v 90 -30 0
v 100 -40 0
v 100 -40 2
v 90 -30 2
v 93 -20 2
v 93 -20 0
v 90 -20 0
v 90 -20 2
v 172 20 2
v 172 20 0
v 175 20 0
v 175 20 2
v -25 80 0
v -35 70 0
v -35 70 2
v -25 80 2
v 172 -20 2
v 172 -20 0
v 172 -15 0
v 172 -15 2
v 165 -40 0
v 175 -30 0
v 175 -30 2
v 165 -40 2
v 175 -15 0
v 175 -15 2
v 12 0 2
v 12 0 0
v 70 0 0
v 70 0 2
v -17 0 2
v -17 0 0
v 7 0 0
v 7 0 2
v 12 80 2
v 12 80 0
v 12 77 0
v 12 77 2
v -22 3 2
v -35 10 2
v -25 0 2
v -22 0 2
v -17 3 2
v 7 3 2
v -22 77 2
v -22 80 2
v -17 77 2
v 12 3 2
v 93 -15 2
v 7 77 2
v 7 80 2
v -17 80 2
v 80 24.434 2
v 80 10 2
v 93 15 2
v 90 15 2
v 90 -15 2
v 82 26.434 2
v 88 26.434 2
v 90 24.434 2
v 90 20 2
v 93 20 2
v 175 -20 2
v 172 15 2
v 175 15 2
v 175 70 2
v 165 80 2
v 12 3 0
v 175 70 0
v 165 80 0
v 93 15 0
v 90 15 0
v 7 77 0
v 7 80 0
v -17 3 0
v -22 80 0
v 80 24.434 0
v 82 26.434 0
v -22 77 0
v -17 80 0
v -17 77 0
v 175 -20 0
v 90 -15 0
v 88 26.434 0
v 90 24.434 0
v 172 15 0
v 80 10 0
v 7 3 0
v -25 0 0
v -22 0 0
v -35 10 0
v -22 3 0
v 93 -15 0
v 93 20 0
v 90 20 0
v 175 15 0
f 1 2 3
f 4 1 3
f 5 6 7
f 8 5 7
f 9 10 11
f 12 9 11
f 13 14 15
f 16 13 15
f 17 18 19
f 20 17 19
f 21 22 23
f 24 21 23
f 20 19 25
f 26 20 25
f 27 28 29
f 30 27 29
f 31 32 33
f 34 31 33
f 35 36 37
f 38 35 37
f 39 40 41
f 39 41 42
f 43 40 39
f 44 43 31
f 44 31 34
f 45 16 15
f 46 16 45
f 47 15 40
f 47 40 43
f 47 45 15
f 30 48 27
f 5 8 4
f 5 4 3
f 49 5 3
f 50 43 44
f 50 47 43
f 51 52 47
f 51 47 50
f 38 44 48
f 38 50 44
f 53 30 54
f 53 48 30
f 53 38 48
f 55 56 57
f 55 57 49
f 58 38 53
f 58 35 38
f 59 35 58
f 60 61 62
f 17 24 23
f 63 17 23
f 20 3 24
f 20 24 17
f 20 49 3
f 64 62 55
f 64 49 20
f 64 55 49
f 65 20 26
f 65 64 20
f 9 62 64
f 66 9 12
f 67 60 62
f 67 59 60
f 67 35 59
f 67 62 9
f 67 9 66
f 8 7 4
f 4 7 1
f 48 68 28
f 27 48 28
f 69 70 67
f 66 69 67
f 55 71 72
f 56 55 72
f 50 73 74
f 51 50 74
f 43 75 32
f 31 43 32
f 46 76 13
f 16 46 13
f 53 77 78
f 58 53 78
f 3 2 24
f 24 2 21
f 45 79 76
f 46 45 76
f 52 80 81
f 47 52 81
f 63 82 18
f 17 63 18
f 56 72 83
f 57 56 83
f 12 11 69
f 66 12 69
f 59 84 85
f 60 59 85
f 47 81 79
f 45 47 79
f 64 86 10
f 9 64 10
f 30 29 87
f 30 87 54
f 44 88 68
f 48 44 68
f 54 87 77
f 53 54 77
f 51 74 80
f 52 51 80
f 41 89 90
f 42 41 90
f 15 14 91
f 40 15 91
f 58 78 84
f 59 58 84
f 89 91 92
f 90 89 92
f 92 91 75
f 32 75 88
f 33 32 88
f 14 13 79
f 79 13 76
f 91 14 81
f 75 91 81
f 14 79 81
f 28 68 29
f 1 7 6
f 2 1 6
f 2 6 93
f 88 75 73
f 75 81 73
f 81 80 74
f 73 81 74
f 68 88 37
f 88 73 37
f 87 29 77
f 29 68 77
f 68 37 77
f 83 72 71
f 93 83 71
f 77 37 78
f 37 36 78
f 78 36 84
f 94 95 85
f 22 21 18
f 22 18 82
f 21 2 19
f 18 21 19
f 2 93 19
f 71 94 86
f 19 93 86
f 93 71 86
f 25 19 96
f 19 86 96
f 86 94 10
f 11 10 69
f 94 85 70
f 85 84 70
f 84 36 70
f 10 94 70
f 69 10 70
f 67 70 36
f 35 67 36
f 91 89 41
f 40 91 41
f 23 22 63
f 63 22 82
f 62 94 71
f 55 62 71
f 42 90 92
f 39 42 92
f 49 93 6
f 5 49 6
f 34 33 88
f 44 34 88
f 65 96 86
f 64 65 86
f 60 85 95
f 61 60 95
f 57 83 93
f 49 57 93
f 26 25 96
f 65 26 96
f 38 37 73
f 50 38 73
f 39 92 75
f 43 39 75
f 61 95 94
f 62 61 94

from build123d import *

# Parameters (mm, degrees)
BOSS_EXTRUDE1_DEPTH = 2
CHAMFER1_SIZE       = 10
CHAMFER2_SIZE       = 10


with BuildPart() as part:
    # Sketch1 → Boss-Extrude1 (new body)
    with BuildSketch(Plane.XY):
        Polygon((80, 24.434280886), (82, 26.434280886), (88, 26.434280886), (90, 24.434280886), (90, 20), (93, 20), (93, 15), (90, 15), (90, 0), (90, -15), (93, -15), (93, -20), (90, -20), (90, -40), (175, -40), (175, -20), (172, -20), (172, -15), (175, -15), (175, 0), (175, 15), (172, 15), (172, 20), (175, 20), (175, 80), (12, 80), (12, 77), (7, 77), (7, 80), (-5, 80), (-17, 80), (-17, 77), (-22, 77), (-22, 80), (-35, 80), (-35, 0), (-22, 0), (-22, 3), (-17, 3), (-17, 0), (-5, 0), (7, 0), (7, 3), (12, 3), (12, 0), (80, 0), align=None)
    extrude(amount=BOSS_EXTRUDE1_DEPTH)

    # Chamfer1
    chamfer1_edges = [part.edges().sort_by_distance(p)[0] for p in [
        (-35, 0, 1),
        (-35, 80, 1),
        (175, 80, 1),
        (175, -40, 1),
        (90, -40, 1),
    ]]
    chamfer(chamfer1_edges, length=CHAMFER1_SIZE)

    # Chamfer2
    chamfer2_edges = [part.edges().sort_by_distance(p)[0] for p in [
        (80, 0, 1),
    ]]
    chamfer(chamfer2_edges, length=CHAMFER2_SIZE)


solid = part.part
